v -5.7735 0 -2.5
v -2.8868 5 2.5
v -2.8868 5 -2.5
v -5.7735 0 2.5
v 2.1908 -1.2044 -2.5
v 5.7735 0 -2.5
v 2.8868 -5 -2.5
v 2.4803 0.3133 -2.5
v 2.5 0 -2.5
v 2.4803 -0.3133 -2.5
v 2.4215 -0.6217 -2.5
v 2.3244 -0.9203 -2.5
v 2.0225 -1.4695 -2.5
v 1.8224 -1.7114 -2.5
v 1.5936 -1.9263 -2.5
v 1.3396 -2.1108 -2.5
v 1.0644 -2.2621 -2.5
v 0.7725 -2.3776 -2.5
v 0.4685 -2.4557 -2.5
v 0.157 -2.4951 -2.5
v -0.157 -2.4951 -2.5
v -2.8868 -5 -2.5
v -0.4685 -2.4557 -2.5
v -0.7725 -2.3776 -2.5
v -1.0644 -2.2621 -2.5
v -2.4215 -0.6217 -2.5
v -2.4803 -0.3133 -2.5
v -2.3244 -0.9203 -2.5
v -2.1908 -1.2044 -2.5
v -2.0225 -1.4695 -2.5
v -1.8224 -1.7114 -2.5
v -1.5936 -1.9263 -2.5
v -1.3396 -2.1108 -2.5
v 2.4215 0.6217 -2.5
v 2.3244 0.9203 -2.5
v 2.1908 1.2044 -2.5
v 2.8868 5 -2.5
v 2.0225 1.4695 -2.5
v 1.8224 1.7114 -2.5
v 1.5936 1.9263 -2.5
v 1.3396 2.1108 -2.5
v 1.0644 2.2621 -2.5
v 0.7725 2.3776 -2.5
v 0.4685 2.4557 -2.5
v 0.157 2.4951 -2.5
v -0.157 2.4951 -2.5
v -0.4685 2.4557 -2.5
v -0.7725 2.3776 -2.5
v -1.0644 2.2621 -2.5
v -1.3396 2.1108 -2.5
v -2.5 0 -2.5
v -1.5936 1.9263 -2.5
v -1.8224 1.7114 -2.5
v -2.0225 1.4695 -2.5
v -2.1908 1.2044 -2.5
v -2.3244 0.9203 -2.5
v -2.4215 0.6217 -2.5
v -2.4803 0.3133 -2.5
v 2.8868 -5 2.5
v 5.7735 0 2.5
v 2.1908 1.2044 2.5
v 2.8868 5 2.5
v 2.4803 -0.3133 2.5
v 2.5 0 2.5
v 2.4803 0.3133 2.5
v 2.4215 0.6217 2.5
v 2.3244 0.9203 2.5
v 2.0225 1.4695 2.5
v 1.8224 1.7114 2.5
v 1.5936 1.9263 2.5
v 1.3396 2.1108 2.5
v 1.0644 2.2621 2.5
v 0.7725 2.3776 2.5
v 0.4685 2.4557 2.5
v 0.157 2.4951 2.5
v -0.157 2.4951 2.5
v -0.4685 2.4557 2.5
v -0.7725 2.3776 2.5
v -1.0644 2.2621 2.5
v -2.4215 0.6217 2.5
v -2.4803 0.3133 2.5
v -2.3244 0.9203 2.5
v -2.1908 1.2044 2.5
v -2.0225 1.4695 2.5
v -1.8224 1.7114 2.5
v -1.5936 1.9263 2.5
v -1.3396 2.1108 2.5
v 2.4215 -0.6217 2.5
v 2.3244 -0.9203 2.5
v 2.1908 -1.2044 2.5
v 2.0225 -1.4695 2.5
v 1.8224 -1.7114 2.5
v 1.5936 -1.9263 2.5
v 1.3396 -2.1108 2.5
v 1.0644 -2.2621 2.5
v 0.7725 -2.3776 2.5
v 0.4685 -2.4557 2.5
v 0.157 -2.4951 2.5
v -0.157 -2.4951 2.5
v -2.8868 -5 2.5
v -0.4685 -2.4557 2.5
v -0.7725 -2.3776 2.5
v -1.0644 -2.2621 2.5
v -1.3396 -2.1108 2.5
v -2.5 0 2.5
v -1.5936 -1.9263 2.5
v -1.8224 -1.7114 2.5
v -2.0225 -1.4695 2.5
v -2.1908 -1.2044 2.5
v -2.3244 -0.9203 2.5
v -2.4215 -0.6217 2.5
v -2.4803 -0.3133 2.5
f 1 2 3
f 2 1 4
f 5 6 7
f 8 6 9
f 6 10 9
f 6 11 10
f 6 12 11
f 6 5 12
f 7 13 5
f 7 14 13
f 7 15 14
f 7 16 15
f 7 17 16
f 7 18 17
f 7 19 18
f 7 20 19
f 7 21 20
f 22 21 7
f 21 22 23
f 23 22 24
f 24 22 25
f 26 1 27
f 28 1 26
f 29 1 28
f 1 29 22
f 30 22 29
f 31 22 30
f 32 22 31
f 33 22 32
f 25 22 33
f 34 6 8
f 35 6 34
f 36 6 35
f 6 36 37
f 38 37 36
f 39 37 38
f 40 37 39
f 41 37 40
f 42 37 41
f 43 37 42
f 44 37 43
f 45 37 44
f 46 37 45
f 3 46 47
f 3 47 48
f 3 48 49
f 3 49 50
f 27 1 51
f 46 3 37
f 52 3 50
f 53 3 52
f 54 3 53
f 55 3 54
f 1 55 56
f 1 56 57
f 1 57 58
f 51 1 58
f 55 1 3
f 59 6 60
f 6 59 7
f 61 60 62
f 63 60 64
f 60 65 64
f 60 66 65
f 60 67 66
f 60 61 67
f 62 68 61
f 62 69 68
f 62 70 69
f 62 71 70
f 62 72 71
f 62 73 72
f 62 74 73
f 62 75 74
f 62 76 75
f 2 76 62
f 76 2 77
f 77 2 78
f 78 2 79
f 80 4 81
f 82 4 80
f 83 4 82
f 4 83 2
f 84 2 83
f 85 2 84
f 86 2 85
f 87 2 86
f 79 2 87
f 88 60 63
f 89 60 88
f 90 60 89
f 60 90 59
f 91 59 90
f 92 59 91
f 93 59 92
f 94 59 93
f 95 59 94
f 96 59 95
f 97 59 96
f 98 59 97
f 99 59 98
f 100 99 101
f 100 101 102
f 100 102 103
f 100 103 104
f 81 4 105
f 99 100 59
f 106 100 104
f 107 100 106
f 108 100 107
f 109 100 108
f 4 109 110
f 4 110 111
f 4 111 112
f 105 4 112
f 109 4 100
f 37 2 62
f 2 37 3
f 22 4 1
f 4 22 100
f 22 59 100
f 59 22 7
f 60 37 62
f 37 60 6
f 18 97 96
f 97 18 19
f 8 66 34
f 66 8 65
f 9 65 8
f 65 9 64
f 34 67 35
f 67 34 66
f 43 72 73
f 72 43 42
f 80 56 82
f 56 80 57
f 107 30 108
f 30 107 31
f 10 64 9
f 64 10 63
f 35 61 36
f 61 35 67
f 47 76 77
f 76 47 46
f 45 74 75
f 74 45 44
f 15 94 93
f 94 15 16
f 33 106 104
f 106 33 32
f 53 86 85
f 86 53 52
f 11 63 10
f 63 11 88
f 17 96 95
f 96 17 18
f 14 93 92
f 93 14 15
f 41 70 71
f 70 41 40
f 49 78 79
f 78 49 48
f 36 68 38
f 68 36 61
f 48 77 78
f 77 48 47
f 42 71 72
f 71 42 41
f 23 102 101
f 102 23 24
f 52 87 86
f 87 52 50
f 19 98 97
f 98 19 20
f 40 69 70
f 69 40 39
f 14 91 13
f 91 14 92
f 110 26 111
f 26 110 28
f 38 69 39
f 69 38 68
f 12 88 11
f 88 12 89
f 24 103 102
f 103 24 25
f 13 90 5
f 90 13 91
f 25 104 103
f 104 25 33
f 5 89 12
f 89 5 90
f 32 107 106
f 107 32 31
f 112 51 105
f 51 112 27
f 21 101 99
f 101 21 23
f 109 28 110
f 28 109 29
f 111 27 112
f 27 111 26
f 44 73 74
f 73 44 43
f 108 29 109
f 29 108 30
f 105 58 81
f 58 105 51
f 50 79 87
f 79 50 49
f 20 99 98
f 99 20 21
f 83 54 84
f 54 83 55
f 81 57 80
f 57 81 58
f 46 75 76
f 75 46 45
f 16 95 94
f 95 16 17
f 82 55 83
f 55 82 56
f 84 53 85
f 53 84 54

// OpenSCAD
// Simple Hex Nut Model (Unthreaded)
// Author: AI Assistant
// Date: 2023-10-27

// --- Parameters ---

// Flat-to-flat width of the hexagon
hex_width = 10; // [mm]

// Diameter of the central hole
hole_diameter = 5; // [mm]

// Thickness (height) of the nut
nut_thickness = 5; // [mm]


// --- Calculations ---

// Calculate the radius needed for a hexagon with the given flat-to-flat width.
// The radius (vertex to center) r = width / (2 * cos(30))
hex_radius = hex_width / (2 * cos(30));

// Calculate the radius of the hole
hole_radius = hole_diameter / 2;

// Small value to ensure clean cuts in difference operations
epsilon = 0.01;


// --- Model Definition ---

// Use difference() to subtract the hole from the hex prism
difference() {
    // 1. Create the main hexagonal prism body
    linear_extrude(height = nut_thickness, center = true) {
        // Create a 2D hexagon centered at the origin
        // Using circle with $fn=6 creates a hexagon
        // The radius is calculated to match the flat-to-flat width
        circle(r = hex_radius, $fn = 6);
    }

    // 2. Create the cylinder for the central hole
    // Make it slightly taller than the nut thickness for a clean subtraction
    cylinder(h = nut_thickness + 2 * epsilon, r = hole_radius, center = true, $fn=50); // Use more facets for a smoother hole
}

// End of script
